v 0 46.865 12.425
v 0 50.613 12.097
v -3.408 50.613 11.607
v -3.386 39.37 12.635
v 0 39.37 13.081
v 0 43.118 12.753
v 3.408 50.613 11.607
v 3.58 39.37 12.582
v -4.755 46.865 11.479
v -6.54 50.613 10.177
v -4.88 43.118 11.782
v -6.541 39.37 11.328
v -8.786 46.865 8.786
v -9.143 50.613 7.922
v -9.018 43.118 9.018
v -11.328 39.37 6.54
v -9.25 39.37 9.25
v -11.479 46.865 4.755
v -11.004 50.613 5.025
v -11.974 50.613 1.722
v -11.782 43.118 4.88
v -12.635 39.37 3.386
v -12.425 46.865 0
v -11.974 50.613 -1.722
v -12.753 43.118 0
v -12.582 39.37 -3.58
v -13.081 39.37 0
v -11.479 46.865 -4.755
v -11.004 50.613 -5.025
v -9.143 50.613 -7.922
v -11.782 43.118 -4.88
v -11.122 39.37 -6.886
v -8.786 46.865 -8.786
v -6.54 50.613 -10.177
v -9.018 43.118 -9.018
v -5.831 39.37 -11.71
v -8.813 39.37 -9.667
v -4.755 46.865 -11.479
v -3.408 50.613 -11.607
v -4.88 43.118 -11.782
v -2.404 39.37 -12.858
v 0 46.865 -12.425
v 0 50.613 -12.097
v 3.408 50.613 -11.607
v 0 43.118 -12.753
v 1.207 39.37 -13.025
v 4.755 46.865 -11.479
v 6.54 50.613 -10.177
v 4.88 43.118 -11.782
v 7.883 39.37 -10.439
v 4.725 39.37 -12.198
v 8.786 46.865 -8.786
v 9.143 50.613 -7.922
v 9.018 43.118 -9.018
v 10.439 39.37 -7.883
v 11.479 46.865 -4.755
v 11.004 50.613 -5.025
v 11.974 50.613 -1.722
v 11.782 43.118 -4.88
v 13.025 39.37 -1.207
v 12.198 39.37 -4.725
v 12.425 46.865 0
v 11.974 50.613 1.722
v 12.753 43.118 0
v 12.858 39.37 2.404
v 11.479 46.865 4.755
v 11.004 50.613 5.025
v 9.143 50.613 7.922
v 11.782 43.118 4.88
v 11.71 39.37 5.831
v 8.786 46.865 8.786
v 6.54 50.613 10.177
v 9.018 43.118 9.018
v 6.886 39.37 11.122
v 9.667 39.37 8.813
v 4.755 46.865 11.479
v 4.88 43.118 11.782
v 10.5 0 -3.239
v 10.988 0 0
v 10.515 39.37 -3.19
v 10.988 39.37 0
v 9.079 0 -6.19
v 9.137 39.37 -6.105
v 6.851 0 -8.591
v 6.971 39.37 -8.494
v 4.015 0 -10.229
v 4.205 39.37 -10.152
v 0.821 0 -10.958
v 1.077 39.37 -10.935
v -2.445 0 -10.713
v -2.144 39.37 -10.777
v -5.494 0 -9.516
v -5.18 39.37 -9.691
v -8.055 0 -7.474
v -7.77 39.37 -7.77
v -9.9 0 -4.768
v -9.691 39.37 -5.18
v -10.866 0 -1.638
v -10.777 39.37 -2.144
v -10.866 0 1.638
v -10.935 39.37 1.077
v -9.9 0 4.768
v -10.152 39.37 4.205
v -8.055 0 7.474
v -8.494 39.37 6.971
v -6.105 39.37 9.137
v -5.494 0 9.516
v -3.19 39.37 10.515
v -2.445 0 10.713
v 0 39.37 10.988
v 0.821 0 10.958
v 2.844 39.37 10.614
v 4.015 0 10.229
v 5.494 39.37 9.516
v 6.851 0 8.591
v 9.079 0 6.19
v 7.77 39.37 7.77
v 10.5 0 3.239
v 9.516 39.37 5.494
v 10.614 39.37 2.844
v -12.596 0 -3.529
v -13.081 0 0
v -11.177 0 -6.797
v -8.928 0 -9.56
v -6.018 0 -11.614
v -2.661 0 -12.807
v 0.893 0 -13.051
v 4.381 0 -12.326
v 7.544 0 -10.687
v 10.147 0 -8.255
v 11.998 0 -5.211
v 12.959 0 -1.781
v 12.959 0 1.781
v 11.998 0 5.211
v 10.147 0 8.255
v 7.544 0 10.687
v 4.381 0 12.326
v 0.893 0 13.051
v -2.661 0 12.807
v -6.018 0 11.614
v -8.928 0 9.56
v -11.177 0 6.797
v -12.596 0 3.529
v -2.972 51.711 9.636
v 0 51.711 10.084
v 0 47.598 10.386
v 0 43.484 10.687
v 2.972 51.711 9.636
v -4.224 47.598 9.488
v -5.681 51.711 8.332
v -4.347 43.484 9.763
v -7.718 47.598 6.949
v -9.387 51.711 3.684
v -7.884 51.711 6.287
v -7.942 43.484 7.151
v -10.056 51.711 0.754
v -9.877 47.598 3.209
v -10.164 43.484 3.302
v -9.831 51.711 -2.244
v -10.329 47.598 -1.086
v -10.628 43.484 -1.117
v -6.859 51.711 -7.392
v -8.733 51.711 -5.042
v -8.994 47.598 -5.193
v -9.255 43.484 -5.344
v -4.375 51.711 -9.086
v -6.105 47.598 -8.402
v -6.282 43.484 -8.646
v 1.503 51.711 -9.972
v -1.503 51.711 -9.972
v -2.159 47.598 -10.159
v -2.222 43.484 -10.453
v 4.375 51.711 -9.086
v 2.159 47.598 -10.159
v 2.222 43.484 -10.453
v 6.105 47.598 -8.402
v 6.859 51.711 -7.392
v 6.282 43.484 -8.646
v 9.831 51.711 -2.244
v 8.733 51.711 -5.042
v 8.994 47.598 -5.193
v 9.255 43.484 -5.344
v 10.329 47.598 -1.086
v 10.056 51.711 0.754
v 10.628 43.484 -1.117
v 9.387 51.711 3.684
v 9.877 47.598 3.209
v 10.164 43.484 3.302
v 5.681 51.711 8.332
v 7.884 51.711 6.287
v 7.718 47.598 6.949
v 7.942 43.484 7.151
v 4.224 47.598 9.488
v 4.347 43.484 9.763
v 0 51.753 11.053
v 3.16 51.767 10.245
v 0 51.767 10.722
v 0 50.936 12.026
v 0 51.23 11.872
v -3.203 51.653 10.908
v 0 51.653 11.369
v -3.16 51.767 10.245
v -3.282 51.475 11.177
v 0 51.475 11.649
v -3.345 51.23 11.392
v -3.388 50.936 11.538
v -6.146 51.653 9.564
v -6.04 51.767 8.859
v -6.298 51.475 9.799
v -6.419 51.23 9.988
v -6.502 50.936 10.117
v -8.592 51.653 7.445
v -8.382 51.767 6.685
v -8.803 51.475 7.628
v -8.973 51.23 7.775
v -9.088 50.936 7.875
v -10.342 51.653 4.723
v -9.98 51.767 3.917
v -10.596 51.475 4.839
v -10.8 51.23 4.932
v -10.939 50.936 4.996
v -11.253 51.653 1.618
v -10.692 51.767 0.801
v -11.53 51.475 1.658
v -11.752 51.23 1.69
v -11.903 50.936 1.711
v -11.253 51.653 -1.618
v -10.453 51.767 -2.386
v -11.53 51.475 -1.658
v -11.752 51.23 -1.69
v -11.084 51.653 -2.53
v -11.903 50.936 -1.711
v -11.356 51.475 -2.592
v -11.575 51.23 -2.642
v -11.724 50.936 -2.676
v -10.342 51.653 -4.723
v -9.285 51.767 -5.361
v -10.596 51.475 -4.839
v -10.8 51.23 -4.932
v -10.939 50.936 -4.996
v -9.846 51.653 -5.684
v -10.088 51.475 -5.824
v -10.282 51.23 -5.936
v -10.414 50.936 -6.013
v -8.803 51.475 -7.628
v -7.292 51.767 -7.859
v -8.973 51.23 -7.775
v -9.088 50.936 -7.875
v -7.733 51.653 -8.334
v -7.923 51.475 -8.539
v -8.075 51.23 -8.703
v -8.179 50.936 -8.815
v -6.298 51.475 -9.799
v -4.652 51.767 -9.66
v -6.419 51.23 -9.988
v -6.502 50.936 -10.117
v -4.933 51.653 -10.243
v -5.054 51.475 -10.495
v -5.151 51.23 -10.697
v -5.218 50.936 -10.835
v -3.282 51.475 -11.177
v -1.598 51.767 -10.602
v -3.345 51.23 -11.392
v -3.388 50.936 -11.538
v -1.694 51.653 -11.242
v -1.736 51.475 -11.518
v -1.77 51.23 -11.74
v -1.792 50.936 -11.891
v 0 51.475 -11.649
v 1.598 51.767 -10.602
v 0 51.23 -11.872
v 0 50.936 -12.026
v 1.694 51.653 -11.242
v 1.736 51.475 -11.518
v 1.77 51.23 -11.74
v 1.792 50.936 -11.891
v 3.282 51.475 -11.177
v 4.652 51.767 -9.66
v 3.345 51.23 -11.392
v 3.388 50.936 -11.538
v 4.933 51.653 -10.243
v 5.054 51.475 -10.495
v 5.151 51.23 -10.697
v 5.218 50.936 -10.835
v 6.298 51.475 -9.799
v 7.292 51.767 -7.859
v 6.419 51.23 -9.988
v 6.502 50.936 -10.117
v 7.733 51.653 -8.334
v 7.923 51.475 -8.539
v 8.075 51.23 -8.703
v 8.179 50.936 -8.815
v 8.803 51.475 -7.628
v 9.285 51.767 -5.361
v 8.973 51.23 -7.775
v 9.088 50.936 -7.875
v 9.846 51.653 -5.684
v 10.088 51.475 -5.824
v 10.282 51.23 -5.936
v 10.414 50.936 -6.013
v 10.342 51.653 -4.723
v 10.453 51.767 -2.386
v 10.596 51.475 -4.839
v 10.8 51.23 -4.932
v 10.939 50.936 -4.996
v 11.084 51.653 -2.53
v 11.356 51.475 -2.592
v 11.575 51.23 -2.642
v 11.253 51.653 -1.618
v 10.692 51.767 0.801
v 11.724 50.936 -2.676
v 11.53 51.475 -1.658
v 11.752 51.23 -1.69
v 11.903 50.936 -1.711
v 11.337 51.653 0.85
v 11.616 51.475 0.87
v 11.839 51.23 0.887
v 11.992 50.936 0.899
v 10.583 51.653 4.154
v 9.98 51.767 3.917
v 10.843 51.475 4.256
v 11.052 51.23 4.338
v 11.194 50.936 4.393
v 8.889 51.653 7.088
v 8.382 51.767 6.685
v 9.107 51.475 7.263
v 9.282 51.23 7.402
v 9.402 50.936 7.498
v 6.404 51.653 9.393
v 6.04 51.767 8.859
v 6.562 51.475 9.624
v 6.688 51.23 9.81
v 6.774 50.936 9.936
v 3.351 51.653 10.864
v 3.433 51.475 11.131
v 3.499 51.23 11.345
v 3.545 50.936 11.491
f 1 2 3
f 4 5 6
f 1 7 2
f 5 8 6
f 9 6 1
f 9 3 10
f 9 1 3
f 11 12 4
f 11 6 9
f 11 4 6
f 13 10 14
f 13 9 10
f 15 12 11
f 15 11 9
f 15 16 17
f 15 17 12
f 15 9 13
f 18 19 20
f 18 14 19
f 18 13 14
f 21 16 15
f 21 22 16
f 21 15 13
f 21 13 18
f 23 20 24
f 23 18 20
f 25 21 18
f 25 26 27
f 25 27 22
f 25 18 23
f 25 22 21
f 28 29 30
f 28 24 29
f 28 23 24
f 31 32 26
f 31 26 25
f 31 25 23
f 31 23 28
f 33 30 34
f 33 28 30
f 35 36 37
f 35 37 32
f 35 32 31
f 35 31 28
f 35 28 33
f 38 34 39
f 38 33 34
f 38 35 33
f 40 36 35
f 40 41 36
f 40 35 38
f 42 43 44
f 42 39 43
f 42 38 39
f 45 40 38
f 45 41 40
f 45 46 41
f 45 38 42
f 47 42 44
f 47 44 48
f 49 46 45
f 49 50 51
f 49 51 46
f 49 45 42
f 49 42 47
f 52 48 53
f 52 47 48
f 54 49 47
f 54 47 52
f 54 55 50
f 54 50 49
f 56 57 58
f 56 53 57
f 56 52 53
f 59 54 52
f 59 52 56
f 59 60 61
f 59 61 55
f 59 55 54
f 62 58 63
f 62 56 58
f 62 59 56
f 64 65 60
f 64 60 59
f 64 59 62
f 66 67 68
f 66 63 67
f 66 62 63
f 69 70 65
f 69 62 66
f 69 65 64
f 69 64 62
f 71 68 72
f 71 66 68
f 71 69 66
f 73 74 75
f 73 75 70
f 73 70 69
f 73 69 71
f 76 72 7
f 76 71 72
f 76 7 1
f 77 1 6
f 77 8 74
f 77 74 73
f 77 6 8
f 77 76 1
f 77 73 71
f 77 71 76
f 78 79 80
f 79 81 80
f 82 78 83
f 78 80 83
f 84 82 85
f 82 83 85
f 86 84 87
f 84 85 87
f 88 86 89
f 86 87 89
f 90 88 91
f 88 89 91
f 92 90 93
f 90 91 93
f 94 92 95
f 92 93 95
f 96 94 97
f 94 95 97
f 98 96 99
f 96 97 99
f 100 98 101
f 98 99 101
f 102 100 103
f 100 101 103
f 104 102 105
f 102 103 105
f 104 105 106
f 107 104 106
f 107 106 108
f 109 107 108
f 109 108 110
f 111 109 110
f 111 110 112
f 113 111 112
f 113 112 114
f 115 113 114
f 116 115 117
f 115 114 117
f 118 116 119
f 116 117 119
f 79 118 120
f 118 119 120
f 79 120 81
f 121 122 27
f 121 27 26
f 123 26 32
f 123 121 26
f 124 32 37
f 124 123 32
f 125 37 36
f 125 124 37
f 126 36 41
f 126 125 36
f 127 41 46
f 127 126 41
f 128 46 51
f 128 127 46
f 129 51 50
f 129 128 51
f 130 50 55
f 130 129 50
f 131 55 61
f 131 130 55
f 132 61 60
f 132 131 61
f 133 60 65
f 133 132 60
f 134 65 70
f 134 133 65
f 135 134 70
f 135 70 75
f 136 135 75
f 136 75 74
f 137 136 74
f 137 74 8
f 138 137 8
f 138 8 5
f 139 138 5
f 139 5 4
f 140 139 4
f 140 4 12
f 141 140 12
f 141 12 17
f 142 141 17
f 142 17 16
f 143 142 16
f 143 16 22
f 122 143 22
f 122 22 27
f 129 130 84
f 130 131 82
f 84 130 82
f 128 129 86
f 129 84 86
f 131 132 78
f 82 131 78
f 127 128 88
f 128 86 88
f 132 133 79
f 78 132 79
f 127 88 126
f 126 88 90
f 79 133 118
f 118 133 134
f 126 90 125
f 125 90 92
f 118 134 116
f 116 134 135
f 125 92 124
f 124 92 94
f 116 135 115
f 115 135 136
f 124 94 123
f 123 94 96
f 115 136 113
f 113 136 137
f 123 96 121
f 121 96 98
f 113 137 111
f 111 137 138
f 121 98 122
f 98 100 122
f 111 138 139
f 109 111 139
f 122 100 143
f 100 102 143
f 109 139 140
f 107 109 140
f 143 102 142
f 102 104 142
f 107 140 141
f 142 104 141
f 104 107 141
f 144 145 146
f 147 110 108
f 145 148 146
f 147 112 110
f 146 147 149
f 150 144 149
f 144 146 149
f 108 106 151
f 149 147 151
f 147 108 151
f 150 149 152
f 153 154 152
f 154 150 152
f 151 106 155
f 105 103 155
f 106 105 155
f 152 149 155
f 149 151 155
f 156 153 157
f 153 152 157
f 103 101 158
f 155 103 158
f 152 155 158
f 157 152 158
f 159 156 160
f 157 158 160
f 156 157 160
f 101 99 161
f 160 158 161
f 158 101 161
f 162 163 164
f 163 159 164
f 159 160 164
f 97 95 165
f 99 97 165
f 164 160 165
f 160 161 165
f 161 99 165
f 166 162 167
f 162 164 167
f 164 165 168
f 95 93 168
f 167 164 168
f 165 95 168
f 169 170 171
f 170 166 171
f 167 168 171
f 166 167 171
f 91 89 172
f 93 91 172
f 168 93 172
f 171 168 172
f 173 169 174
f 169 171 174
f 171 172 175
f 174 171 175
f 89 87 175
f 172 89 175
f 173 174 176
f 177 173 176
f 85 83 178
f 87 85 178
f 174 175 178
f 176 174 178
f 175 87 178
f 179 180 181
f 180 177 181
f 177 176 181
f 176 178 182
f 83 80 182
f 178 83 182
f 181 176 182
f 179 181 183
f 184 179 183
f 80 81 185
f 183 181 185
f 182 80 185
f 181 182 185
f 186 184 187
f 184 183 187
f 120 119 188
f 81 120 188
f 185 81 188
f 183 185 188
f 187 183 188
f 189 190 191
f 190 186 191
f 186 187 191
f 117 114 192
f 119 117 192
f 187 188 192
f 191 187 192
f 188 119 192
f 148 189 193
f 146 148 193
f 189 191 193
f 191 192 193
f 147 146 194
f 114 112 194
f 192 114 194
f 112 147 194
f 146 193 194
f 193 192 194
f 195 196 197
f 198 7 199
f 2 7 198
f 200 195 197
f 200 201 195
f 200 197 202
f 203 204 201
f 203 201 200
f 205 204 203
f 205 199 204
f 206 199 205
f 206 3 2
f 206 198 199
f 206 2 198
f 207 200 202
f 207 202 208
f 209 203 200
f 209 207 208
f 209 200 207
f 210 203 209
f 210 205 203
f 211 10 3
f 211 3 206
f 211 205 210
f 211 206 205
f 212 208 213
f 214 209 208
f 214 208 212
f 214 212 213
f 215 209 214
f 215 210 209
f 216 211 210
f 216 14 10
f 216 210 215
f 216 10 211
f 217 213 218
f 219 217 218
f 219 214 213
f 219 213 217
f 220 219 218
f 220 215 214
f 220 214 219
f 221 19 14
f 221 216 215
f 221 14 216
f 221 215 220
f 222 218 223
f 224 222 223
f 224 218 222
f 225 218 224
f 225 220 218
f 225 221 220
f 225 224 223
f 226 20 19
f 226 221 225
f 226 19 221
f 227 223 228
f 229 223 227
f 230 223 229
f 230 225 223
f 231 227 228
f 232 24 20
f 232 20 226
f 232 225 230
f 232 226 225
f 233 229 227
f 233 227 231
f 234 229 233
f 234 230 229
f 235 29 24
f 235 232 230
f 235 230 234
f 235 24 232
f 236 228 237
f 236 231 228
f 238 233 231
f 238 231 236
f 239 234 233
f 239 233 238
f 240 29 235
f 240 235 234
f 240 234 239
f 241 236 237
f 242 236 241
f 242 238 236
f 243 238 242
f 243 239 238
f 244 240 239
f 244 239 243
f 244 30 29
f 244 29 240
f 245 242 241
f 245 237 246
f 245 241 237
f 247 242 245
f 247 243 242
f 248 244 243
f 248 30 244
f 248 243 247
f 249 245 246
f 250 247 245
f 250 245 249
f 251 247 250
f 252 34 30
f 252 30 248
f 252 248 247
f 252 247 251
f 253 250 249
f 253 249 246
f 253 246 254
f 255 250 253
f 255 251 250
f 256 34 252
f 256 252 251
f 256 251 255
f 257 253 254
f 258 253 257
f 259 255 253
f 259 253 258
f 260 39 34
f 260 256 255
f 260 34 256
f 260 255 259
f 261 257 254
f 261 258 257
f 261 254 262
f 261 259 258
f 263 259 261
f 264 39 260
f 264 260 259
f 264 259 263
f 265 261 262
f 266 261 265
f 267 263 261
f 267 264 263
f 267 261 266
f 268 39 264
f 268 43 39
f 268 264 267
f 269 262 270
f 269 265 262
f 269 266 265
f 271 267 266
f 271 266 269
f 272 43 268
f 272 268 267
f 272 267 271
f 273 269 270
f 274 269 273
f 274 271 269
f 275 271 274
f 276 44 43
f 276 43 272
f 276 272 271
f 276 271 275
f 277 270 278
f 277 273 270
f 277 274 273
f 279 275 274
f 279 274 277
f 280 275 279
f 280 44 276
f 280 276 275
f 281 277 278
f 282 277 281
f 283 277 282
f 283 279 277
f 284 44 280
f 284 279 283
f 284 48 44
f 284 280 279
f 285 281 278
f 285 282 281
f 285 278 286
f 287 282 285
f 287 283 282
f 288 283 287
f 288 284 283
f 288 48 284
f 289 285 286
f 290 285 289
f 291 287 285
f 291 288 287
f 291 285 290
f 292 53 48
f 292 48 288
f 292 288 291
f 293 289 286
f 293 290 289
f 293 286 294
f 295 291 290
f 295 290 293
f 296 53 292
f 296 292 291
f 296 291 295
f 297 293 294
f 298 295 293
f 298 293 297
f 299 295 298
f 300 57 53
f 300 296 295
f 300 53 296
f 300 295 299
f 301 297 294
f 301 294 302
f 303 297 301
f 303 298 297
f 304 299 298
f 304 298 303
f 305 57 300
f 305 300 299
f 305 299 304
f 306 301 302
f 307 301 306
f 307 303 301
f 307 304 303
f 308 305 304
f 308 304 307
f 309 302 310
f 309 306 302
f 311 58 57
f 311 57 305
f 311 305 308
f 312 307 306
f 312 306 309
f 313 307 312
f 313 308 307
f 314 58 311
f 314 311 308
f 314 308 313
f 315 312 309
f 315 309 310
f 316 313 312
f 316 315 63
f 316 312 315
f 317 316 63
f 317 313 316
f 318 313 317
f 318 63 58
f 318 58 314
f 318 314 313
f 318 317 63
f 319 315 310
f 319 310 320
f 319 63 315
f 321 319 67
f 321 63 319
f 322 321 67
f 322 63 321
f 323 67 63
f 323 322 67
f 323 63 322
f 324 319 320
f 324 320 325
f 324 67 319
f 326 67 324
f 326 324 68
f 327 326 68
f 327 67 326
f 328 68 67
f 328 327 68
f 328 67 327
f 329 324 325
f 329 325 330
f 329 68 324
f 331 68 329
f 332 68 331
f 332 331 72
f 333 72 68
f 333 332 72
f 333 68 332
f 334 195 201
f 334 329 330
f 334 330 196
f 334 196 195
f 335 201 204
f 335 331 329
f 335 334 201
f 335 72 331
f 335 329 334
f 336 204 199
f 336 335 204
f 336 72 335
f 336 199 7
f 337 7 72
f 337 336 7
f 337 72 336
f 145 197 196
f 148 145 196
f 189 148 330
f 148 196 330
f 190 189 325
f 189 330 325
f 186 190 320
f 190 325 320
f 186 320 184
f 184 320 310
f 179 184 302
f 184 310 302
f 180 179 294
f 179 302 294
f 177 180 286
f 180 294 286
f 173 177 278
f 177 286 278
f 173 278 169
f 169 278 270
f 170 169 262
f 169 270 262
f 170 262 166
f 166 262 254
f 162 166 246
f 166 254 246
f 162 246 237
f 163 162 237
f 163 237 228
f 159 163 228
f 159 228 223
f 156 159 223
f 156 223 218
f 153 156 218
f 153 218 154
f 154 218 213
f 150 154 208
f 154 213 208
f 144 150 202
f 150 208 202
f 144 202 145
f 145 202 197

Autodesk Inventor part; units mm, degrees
ref_plane "XZ Plane" through (0, 0, 0) normal (0, 1, 0) x (-1, 0, 0)
ref_plane "XY Plane" through (0, 0, 0) normal (0, 0, 1) x (1, 0, 0)
sketch "Sketch1" plane through (0, 0, 0) normal (0, 1, 0) x (-1, 0, 0)
  circle A0 centre (0, 0) radius 13.081
  dimension "d0" = 26.162
extrude "Extrusion1" add sketch "Sketch1" along normal blind 39.37
sketch "Sketch2" plane through (0, 39.37, 0) normal (0, 1, 0) x (1, 0, 0)
  circle A0 centre (0, 0) radius 10.9884
extrude "Extrusion2" cut sketch "Sketch2" against normal through all
sketch "Sketch3" plane through (0, 39.37, 0) normal (0, 1, 0) x (1, 0, 0)
  point P0 (0, 0)
ref_plane "Work Plane1" through (0, 0, 0) normal (1, 0, 0) x (0, 1, 0)
sketch "Sketch4" plane through (0, 0, 0) normal (1, 0, 0) x (0, 1, 0)
  line L0 (39.37, -13.081) -> (39.37, 13.081) projected
  line L1 (39.37, 13.081) -> (52.07, 13.081) construction
  line L2 (39.37, 0) -> (51.6373, 0)
  line L3 (39.37, 10.9884) -> (39.37, -10.9884) projected
  line L4 (39.37, 10.9884) -> (51.7114, 10.0843)
  line L5 (39.37, 13.081) -> (50.6127, 12.0974)
  line L6 (39.37, 13.081) -> (50.6556, 13.081) construction
  line L7 (51.7671, 10.7215) -> (51.7114, 10.0843)
  arc A0 (51.7671, 10.7215) -> (50.6127, 12.0974) centre (50.502, 10.8322) ccw
  point P0 (0, 0)
  dimension "d6" = 12.7
  dimension "d8" = 5
  dimension "d9" = 1.27
revolve "Revolution1" add sketch "Sketch4" angle 360 about axis through (0, 39.37, 0) along (0, 1, 0)
sketch "Sketch5" plane through (0, 0, 0) normal (1, 0, 0) x (0, 1, 0)
  line L0 (39.37, -13.081) -> (39.37, 13.081) projected
  line L1 (39.37, 10.9828) -> (51.7114, 10.0843)
  line L2 (51.7114, 10.0843) -> (39.37, 10.9884) projected
  point P0 (0, 0)
properties part number "cylinder part"
